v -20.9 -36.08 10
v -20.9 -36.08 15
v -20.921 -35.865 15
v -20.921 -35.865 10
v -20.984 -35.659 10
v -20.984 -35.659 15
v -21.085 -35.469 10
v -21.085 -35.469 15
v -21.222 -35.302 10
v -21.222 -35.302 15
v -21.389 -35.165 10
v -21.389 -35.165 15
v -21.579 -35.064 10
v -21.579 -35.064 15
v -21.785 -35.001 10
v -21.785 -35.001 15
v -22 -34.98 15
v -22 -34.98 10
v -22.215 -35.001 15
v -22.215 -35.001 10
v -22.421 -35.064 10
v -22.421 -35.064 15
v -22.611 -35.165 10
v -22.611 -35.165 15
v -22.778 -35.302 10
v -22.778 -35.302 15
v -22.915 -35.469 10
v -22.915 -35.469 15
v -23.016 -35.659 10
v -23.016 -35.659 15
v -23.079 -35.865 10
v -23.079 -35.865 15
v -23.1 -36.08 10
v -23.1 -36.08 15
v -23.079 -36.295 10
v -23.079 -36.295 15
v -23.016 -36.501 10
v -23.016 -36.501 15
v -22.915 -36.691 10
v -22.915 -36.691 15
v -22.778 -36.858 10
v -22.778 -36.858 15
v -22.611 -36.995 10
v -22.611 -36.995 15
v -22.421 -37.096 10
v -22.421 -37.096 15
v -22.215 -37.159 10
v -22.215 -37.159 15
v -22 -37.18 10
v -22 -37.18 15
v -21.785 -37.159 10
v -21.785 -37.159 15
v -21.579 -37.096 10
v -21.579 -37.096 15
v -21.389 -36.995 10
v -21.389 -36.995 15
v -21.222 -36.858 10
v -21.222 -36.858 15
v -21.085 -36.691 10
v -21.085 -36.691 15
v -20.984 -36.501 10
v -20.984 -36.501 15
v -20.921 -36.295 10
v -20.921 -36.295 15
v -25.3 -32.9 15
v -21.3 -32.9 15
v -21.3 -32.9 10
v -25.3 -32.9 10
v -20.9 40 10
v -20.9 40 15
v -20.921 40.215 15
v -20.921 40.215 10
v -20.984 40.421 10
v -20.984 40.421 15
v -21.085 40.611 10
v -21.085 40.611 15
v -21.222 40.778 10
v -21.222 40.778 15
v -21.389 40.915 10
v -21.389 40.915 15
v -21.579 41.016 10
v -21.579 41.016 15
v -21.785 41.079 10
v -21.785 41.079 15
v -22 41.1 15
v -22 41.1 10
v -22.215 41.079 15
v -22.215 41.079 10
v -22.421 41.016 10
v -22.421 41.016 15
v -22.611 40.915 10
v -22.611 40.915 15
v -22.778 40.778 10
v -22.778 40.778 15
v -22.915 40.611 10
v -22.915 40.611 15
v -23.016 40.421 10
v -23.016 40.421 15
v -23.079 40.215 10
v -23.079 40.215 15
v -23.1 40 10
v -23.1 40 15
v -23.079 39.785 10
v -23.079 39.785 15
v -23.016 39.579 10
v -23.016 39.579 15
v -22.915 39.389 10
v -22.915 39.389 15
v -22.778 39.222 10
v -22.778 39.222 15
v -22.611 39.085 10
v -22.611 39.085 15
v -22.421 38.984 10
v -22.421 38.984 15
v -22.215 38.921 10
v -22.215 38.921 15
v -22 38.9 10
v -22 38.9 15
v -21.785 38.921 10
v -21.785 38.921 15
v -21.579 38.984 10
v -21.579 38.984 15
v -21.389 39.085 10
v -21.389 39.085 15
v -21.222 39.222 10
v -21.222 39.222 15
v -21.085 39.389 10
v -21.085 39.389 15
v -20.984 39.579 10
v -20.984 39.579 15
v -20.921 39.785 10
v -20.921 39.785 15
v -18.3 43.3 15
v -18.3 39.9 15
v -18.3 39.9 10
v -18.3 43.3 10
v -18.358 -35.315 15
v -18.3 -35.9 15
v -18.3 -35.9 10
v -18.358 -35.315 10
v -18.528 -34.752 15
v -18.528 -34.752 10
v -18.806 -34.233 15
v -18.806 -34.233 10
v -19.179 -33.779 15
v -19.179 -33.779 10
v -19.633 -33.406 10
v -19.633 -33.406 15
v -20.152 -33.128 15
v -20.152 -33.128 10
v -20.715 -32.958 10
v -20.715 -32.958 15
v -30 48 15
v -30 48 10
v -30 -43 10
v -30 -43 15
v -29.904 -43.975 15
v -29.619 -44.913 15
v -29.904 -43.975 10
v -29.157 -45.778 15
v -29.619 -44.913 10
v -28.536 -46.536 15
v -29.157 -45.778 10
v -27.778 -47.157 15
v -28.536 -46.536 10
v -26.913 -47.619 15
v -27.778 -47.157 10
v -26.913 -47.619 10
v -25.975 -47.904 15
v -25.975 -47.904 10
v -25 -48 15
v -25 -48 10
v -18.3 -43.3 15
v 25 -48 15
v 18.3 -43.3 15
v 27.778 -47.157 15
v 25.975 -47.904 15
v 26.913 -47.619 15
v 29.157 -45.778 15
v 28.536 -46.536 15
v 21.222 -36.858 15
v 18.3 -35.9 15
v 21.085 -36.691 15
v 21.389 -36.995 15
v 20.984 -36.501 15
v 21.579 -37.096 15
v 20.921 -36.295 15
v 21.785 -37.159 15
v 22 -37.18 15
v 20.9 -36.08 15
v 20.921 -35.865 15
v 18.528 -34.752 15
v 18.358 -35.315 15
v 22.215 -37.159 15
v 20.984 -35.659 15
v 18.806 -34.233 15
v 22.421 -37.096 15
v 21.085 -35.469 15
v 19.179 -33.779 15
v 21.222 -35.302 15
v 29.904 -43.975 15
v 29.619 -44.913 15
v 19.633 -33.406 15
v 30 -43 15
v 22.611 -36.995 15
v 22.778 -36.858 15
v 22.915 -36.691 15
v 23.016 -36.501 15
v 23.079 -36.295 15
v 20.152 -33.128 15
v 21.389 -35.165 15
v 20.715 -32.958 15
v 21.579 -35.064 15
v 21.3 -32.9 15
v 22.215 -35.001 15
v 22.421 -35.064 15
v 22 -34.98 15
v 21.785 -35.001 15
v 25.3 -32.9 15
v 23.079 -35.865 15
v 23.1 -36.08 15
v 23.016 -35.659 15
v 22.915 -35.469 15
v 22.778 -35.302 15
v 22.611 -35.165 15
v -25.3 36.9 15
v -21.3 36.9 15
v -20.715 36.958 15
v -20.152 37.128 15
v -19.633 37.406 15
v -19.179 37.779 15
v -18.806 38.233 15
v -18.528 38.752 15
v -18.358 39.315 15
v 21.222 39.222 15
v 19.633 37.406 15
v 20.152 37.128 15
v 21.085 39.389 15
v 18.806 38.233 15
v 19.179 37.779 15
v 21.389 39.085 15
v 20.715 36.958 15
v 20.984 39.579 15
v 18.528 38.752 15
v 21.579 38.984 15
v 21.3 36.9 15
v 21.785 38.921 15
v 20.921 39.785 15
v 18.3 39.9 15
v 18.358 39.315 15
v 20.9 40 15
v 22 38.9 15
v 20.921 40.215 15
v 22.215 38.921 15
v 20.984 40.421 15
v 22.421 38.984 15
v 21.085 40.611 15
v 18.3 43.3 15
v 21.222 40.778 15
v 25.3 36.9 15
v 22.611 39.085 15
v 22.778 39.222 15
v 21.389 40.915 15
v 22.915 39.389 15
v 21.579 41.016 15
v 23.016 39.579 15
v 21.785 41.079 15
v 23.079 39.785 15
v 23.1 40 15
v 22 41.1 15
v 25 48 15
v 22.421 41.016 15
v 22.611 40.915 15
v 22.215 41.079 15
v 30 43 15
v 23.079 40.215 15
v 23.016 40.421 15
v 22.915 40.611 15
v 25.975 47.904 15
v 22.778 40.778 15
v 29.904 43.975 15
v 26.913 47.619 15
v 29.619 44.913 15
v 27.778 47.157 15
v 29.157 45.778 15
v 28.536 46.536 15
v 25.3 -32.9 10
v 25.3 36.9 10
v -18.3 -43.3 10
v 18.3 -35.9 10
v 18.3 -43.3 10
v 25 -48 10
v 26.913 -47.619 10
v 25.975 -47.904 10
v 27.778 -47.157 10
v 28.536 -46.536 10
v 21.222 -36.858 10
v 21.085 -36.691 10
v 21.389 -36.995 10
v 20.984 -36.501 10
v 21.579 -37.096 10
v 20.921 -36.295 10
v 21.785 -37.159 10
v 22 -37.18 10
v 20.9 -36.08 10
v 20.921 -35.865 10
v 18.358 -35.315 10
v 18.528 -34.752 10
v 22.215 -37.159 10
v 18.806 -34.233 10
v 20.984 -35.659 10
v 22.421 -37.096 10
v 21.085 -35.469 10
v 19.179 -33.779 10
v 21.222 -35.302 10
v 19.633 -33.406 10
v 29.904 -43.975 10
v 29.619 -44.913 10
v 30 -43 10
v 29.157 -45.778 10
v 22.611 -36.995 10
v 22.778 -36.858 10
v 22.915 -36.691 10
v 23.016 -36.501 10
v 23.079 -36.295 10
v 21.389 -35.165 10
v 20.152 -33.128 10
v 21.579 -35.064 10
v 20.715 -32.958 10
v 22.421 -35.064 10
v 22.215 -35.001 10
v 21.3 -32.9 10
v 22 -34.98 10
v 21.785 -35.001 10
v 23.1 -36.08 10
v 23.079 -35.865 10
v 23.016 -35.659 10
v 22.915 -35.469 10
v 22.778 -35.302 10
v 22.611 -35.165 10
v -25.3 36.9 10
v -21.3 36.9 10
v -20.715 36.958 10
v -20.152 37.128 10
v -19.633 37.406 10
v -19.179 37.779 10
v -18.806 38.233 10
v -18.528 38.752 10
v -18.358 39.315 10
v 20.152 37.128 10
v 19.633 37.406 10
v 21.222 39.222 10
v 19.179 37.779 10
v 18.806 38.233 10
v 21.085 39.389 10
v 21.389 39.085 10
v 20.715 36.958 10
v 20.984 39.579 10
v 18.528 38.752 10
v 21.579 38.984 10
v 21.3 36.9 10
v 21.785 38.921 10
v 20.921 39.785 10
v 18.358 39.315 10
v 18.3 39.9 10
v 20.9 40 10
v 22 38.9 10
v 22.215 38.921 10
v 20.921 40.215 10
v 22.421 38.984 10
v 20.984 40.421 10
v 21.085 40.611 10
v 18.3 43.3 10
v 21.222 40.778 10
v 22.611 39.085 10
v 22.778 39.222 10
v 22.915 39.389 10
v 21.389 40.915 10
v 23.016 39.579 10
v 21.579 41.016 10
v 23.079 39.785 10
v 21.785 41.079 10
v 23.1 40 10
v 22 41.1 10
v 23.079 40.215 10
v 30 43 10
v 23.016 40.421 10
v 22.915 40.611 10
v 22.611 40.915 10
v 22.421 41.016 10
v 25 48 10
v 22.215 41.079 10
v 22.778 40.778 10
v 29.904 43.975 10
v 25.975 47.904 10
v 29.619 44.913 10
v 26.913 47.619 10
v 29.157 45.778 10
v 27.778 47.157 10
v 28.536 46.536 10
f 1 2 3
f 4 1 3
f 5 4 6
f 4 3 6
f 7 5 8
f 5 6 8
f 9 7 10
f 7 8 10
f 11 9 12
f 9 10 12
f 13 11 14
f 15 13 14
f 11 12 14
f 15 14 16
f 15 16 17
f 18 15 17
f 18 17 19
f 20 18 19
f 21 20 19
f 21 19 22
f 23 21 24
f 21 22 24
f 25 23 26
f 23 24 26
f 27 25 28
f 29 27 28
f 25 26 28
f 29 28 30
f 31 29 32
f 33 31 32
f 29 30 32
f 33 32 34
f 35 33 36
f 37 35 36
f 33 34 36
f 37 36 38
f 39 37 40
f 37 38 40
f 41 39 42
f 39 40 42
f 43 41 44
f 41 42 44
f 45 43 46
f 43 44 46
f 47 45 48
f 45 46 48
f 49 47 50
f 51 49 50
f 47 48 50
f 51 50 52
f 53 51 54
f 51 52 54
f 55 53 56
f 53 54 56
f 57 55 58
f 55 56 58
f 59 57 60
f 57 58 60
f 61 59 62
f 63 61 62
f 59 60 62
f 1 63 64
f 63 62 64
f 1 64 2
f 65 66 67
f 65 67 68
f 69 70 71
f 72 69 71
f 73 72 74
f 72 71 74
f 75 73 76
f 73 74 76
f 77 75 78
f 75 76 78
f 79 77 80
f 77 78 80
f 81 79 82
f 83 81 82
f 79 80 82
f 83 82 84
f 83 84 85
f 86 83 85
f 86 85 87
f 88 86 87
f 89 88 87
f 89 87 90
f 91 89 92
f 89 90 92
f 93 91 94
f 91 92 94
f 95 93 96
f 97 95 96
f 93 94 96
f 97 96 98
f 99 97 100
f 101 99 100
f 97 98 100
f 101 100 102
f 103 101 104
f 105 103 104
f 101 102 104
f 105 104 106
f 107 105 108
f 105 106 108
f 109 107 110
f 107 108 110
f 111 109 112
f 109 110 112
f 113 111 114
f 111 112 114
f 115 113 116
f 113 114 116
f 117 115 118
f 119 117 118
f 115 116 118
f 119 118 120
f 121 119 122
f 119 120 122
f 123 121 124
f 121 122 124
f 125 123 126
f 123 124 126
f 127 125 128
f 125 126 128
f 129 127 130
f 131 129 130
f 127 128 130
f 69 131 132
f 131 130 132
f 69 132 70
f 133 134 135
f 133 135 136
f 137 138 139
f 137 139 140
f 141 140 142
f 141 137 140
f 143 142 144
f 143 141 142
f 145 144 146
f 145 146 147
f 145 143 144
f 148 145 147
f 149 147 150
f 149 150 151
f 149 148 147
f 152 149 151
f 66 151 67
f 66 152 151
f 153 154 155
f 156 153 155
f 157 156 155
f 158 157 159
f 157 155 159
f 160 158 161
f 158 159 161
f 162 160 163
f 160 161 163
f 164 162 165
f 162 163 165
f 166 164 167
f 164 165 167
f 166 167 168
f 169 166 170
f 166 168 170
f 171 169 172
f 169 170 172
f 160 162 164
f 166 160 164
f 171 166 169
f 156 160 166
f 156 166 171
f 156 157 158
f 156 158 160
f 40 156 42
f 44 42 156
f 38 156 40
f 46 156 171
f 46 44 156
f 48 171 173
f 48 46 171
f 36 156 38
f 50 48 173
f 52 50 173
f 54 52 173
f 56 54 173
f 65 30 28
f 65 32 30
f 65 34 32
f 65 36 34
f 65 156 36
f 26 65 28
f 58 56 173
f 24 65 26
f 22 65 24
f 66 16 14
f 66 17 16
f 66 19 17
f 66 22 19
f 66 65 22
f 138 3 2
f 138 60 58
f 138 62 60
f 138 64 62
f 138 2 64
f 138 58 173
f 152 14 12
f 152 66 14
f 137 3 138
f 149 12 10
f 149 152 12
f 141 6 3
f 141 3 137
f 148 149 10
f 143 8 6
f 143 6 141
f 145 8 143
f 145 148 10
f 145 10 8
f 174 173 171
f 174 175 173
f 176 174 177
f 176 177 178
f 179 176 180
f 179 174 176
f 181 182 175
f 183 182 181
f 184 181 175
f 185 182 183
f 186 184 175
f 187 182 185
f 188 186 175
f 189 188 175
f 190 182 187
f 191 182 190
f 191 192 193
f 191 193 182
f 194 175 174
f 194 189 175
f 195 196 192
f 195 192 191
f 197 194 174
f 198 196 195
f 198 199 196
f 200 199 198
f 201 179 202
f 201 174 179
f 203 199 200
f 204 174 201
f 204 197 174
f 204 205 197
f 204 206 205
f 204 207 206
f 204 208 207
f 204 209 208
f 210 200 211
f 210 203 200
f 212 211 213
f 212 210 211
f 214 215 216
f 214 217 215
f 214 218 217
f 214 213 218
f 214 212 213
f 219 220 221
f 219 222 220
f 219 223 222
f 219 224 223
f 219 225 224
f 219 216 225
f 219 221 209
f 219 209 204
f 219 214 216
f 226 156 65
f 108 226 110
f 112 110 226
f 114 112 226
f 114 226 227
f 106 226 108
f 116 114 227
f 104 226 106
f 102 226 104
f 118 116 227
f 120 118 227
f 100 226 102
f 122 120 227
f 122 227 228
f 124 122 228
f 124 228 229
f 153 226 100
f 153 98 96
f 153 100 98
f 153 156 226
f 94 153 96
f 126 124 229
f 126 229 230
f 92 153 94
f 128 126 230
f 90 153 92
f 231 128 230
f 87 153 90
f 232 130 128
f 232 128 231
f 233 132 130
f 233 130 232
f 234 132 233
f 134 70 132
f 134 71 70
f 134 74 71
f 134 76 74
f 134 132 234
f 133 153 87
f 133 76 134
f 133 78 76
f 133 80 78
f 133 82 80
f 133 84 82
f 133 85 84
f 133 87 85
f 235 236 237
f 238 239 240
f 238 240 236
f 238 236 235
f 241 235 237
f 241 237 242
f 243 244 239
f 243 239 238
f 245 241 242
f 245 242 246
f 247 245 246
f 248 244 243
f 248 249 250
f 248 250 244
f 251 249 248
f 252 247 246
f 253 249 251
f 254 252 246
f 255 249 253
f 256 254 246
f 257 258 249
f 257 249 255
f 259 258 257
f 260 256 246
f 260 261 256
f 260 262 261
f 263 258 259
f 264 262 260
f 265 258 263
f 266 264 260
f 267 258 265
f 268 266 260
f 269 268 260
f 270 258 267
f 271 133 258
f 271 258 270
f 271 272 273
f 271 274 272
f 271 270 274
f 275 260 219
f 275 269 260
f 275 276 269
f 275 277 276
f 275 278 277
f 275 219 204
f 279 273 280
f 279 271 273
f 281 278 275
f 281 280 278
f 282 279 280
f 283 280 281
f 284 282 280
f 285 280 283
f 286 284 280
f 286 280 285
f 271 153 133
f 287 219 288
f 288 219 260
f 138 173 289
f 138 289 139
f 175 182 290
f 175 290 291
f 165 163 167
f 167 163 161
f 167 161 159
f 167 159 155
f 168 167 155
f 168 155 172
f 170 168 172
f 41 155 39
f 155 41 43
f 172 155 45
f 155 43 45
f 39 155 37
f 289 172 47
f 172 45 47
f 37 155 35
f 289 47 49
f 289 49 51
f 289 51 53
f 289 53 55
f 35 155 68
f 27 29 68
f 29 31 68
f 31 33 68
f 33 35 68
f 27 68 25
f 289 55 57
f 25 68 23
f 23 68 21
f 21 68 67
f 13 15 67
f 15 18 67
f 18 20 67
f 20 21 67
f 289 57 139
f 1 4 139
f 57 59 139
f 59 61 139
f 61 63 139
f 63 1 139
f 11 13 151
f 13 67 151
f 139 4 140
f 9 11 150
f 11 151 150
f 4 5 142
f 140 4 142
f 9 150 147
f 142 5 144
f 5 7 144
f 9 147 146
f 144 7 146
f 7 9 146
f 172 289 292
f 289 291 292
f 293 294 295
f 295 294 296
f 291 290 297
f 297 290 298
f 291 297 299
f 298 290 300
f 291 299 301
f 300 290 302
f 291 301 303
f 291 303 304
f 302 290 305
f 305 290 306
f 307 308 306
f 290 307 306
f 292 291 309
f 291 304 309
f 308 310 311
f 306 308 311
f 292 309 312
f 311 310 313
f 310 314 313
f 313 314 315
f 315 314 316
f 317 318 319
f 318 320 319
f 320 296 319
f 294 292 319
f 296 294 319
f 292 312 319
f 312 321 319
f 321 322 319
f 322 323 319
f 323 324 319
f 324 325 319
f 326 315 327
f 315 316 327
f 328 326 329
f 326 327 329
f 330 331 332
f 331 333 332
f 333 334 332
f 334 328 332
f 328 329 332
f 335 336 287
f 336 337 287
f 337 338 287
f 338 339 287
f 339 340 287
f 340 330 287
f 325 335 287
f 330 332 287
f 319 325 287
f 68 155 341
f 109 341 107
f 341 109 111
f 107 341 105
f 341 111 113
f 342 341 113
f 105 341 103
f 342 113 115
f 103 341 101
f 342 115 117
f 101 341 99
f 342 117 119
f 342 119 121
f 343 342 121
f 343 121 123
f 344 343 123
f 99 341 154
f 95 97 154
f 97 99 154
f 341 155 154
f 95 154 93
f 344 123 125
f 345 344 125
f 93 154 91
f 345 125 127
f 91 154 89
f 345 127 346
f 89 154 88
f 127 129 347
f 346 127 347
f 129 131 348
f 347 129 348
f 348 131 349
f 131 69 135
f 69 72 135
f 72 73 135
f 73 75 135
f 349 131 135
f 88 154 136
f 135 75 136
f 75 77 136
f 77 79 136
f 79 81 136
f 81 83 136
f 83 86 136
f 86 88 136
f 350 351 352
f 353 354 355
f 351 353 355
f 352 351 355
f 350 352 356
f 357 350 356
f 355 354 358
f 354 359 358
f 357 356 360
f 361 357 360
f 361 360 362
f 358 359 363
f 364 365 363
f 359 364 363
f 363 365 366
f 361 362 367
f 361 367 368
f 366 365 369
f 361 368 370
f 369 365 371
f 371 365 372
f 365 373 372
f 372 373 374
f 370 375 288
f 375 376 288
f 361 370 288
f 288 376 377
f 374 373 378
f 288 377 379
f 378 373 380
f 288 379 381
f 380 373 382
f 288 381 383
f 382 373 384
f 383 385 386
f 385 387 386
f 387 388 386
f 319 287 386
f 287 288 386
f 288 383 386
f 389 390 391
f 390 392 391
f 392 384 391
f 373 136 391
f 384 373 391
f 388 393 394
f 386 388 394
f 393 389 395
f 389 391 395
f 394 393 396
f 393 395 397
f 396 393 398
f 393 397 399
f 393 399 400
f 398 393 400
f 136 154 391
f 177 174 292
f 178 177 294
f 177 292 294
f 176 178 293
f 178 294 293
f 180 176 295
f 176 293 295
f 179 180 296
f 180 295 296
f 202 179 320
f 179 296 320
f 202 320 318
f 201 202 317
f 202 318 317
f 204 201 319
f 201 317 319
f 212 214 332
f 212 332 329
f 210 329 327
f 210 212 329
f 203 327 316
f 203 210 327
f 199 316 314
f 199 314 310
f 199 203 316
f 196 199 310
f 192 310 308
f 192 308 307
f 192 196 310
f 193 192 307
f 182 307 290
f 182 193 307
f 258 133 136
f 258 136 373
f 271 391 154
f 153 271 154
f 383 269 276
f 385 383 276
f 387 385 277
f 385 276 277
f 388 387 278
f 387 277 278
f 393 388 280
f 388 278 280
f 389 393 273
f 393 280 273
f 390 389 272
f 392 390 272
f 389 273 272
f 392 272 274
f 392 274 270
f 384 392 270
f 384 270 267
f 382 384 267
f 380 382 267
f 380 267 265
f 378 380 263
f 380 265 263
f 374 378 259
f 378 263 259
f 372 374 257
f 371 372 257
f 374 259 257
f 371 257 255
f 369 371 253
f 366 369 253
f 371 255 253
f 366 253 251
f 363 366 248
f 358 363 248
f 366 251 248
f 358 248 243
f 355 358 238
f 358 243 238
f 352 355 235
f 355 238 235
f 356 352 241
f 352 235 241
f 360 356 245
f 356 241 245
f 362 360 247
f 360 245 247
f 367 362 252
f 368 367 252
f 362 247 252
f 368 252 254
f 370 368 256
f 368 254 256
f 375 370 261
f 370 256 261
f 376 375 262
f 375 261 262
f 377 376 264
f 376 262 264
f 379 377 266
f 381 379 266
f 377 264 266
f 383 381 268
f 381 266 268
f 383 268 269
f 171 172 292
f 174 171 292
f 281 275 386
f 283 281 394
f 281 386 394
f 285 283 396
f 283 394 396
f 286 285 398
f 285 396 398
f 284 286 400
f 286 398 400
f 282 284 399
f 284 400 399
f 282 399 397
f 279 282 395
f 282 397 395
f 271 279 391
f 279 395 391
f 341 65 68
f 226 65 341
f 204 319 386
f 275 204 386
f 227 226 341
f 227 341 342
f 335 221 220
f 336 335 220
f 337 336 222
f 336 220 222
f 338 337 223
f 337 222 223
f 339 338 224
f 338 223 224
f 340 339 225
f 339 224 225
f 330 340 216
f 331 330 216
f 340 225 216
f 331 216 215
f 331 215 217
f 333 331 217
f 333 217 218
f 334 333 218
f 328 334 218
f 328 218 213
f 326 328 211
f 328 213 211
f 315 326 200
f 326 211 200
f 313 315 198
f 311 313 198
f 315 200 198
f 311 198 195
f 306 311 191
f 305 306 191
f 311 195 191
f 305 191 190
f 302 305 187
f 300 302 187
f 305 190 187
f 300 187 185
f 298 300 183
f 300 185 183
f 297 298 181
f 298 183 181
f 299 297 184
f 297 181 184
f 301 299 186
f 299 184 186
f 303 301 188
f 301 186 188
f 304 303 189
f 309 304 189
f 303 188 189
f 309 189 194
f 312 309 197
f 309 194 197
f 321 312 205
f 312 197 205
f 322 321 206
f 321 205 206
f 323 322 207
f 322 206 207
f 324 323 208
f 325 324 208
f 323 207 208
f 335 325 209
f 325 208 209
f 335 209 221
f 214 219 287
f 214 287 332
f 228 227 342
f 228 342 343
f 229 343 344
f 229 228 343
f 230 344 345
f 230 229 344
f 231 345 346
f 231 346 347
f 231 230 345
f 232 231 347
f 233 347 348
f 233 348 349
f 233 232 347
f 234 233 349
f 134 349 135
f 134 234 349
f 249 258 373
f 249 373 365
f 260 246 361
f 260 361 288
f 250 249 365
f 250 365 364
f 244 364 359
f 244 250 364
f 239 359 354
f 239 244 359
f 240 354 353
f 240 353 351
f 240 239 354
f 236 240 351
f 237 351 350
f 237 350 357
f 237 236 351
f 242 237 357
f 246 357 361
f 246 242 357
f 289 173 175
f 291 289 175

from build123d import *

# Parameters (mm, degrees)
F0_R     = 1.5
F1_DEPTH = 15
F2_W     = 50.6
F2_H     = 86.6
F2_R     = 1.5
F3_DEPTH = 22
F4_R     = 1.1
F5_DEPTH = 5
F6_W     = 105.847951
F6_H     = 180.898867
F7_DEPTH = 10


with BuildPart() as f1:
    # F0 (on Top) → F1 (new body)
    with BuildSketch(Plane.XY):
        with BuildLine():
            Line((-25, -48), (25, -48))
            ThreePointArc((25, -48), (28.535534, -46.535534), (30, -43))
            Line((30, -43), (30, 43))
            ThreePointArc((30, 43), (28.535534, 46.535534), (25, 48))
            Line((25, 48), (-27, 48))
            Line((-27, 48), (-30, 48))
            Line((-30, 48), (-30, 43))
            Line((-30, 43), (-30, -43))
            ThreePointArc((-30, -43), (-28.535534, -46.535534), (-25, -48))
        make_face()
        with Locations((-22, -36.08)):
            Circle(F0_R, mode=Mode.SUBTRACT)
        with Locations((22, -36.08)):
            Circle(F0_R, mode=Mode.SUBTRACT)
        with Locations((-22, 40)):
            Circle(F0_R, mode=Mode.SUBTRACT)
        with Locations((22, 40)):
            Circle(F0_R, mode=Mode.SUBTRACT)
    extrude(amount=F1_DEPTH)

    # F2 (on face) → F3 (cut)
    with BuildSketch(Plane.XY.offset(15)):
        Rectangle(F2_W, F2_H)
        with Locations((-22, -36.08)):
            Circle(F2_R, mode=Mode.SUBTRACT)
        with Locations((22, -36.08)):
            Circle(F2_R, mode=Mode.SUBTRACT)
        with Locations((-22, 40)):
            Circle(F2_R, mode=Mode.SUBTRACT)
        with Locations((22, 40)):
            Circle(F2_R, mode=Mode.SUBTRACT)
    extrude(amount=-F3_DEPTH, mode=Mode.SUBTRACT)

    # F4 (on face) → F5 (join)
    with BuildSketch(Plane.XY.offset(15)):
        with BuildLine():
            Line((-18.3, 43.3), (-25.3, 43.3))
            Line((-25.3, 43.3), (-25.3, 36.9))
            Line((-25.3, 36.9), (-21.3, 36.9))
            ThreePointArc((-21.3, 36.9), (-19.17868, 37.77868), (-18.3, 39.9))
            Line((-18.3, 39.9), (-18.3, 43.3))
        make_face()
        with Locations((-22, 40)):
            Circle(F4_R, mode=Mode.SUBTRACT)
        with BuildLine():
            Line((25.3, 36.9), (25.3, 43.3))
            Line((25.3, 43.3), (18.3, 43.3))
            Line((18.3, 43.3), (18.3, 39.9))
            ThreePointArc((18.3, 39.9), (19.17868, 37.77868), (21.3, 36.9))
            Line((21.3, 36.9), (25.3, 36.9))
        make_face()
        with Locations((22, 40)):
            Circle(F4_R, mode=Mode.SUBTRACT)
        with BuildLine():
            Line((18.3, -43.3), (25.3, -43.3))
            Line((25.3, -43.3), (25.3, -32.9))
            Line((25.3, -32.9), (21.3, -32.9))
            ThreePointArc((21.3, -32.9), (19.17868, -33.77868), (18.3, -35.9))
            Line((18.3, -35.9), (18.3, -43.3))
        make_face()
        with Locations((22, -36.08)):
            Circle(F4_R, mode=Mode.SUBTRACT)
        with BuildLine():
            Line((-25.3, -32.9), (-25.3, -43.3))
            Line((-25.3, -43.3), (-18.3, -43.3))
            Line((-18.3, -43.3), (-18.3, -35.9))
            ThreePointArc((-18.3, -35.9), (-19.17868, -33.77868), (-21.3, -32.9))
            Line((-21.3, -32.9), (-25.3, -32.9))
        make_face()
        with Locations((-22, -36.08)):
            Circle(F4_R, mode=Mode.SUBTRACT)
    extrude(amount=-F5_DEPTH)

    # F6 (on face) → F7 (cut)
    with BuildSketch(Plane(origin=(0, 0, 0), x_dir=(1, 0, 0), z_dir=(0, 0, -1))):
        with Locations((-5.788153, -4.893799)):
            Rectangle(F6_W, F6_H)
    extrude(amount=-F7_DEPTH, mode=Mode.SUBTRACT)


solid = f1.part
